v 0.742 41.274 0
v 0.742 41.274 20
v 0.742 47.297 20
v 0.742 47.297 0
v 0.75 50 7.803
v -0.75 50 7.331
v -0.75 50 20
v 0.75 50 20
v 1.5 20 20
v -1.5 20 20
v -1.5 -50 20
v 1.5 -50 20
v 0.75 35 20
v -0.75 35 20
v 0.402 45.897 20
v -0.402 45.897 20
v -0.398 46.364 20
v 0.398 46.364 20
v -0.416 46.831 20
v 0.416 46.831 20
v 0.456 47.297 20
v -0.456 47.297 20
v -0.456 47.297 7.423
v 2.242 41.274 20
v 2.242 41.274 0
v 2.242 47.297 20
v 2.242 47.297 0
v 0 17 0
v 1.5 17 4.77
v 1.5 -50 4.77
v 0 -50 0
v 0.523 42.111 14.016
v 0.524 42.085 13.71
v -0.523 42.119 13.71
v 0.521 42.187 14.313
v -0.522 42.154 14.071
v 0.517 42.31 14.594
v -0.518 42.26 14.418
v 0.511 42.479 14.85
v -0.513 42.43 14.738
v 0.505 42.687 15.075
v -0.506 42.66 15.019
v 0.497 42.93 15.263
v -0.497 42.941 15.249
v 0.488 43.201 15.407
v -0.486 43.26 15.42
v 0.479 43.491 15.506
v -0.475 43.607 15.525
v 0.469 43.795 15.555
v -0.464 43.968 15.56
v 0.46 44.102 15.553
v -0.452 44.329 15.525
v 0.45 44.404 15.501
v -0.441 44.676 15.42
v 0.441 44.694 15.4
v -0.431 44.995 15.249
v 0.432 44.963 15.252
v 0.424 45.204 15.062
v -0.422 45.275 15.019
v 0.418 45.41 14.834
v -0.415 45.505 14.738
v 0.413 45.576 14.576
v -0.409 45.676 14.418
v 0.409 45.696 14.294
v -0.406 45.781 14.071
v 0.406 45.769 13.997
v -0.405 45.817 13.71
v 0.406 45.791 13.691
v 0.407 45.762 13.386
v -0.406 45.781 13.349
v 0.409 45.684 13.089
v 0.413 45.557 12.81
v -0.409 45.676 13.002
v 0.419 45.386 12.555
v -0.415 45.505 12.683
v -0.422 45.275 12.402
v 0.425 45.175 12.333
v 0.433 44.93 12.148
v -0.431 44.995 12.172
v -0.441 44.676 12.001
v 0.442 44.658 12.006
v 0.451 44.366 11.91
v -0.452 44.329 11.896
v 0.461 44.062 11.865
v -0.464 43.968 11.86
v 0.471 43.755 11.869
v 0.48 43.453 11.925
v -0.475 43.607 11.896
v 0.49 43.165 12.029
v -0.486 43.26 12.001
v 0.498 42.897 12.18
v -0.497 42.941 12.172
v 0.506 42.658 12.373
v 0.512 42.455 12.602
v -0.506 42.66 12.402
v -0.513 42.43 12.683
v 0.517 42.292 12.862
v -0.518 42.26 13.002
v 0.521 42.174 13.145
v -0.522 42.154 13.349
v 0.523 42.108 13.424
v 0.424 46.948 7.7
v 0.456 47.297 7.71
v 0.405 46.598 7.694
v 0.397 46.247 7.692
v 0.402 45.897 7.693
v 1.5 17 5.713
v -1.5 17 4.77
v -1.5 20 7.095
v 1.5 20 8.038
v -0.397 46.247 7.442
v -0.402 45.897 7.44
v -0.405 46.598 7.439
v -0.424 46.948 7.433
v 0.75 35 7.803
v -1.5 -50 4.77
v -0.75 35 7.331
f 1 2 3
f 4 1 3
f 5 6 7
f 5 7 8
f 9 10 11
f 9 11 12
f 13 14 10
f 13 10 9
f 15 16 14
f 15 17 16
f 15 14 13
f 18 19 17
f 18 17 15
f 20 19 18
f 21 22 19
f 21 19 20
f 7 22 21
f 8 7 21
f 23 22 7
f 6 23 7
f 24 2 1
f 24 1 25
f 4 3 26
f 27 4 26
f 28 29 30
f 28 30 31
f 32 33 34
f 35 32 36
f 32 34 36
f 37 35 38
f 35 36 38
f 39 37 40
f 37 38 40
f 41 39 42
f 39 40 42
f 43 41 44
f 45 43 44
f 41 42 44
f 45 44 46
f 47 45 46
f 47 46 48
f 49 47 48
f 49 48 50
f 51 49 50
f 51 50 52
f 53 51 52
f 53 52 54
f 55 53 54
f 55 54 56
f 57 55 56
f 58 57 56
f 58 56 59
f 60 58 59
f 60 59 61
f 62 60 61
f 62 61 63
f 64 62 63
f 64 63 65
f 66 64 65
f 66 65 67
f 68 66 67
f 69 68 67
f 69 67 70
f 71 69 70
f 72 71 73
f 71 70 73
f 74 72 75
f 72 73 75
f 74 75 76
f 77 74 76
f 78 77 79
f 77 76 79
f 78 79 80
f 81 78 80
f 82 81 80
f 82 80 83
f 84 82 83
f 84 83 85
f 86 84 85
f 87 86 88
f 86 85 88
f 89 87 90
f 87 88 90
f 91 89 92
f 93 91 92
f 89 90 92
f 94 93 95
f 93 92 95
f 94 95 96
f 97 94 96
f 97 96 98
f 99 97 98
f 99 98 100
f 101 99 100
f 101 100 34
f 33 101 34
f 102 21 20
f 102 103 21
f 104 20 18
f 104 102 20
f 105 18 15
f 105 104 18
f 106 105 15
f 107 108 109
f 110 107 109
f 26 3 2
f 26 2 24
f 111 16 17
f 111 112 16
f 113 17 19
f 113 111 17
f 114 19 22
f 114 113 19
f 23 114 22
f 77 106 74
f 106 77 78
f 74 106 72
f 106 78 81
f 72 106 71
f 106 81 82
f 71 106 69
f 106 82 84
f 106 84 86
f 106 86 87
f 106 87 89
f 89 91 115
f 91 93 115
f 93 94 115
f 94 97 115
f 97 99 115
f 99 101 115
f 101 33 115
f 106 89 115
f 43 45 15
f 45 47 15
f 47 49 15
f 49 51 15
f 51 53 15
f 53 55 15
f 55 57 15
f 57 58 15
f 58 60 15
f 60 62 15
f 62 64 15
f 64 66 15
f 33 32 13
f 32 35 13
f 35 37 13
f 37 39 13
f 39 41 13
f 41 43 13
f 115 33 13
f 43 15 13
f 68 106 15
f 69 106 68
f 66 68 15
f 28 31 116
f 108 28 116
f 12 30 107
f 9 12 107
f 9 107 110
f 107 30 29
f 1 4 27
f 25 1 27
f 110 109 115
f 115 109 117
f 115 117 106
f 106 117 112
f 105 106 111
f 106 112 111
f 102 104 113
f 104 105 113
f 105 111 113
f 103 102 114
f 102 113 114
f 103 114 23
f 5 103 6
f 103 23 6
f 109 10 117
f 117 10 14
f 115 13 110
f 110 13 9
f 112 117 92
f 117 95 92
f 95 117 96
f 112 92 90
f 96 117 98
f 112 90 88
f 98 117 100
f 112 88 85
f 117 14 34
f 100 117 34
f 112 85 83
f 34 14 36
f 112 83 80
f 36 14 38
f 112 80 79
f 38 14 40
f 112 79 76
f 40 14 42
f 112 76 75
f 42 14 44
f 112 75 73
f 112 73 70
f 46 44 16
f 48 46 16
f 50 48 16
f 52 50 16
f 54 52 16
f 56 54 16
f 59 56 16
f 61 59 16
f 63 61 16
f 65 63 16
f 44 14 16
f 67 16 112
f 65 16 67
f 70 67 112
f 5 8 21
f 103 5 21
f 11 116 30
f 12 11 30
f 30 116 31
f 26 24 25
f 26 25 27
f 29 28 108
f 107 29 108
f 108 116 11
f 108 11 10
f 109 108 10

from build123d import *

# Parameters (mm, degrees)
F0_W      = 3
F0_H      = 100
F1_DEPTH  = 20
F2_W      = 1
F2_H      = 4.7696960071
F3_DEPTH  = 100.001
F5_DEPTH  = 20.001
F7_DEPTH  = 7.4319088021
F8_R      = 10
F9_R      = 1.85
F10_DEPTH = 4.9600119411
F11_W     = 1.5
F11_H     = 6.0229186812
F12_DEPTH = 20


# Not quite as in the source:
# - the program builds the solid bodies; features that only make, move or delete a surface that nothing else refers to are left out


with BuildPart() as f1:
    # F0 (on Top) → F1 (new body)
    with BuildSketch(Plane.XY):
        Rectangle(F0_W, F0_H)
    extrude(amount=F1_DEPTH)

    # F2 (on face) → F3 (cut, through all)
    with BuildSketch(Plane.XZ.offset(50)):
        with Locations((-2, 2.3848480035)):
            Rectangle(F2_W, F2_H)
        Polygon((-1.5, 0), (0, 0), (-1.5, 4.7696960071), align=None)
        Polygon((1.5, 4.7696960071), (0, 0), (1.5, 0), align=None)
        with Locations((2, 2.3848480035)):
            Rectangle(F2_W, F2_H)
    extrude(amount=-F3_DEPTH, mode=Mode.SUBTRACT)

    # F4 (on face) → F5 (cut, through all)
    with BuildSketch(Plane.XY.offset(20)):
        Polygon((-1.62, 20), (-1.5, 20), (-0.75, 35), (-0.38, 46.598598361), (-0.75, 50), (-1.62, 50), align=None)
        Polygon((1.62, 20), (1.62, 50), (0.75, 50), (0.38, 46.598598361), (0.75, 35), (1.5, 20), align=None)
    extrude(amount=-F5_DEPTH, mode=Mode.SUBTRACT)

    # F6 (on face) → F7 (cut, through all)
    with BuildSketch(Plane(origin=(0, 0, 0), x_dir=(0, -1, 0), z_dir=(-0.9539392014, 0, -0.3))):
        Polygon((-20, 7.2181625292), (-50.5925305188, 7.2181625292), (-50.5925305188, -0.6273934268), (-17, -0.6273934268), (-17, 5), align=None)
    extrude(amount=-F7_DEPTH, mode=Mode.SUBTRACT)

    # F8
    f8_edges = [f1.edges().sort_by_distance(p)[0] for p in [
        (-0.75, 35, 13.665413),
        (0.75, 35, 13.901277),
        (0.38, 46.598598, 13.843097),
        (-0.38, 46.598598, 13.723593),
    ]]
    fillet(f8_edges, radius=F8_R)

    # F9 (on face) → F10 (cut, through all)
    with BuildSketch(Plane(origin=(-1.8646167189, 0.0594820309, 0), x_dir=(-0.0318841872, -0.9994915701, 0), z_dir=(-0.9994915701, 0.0318841872, 0))):
        with Locations((-43.930772692, 13.7103971598)):
            Circle(F9_R)
    extrude(amount=-F10_DEPTH, mode=Mode.SUBTRACT)


with BuildPart() as f12:
    # F11 (on face) → F12 (new body)
    with BuildSketch(Plane.XY.offset(20)):
        with Locations((1.491804529, 44.2853828522)):
            Rectangle(F11_W, F11_H)
    extrude(amount=-F12_DEPTH)


solid = Compound([f1.part, f12.part])
